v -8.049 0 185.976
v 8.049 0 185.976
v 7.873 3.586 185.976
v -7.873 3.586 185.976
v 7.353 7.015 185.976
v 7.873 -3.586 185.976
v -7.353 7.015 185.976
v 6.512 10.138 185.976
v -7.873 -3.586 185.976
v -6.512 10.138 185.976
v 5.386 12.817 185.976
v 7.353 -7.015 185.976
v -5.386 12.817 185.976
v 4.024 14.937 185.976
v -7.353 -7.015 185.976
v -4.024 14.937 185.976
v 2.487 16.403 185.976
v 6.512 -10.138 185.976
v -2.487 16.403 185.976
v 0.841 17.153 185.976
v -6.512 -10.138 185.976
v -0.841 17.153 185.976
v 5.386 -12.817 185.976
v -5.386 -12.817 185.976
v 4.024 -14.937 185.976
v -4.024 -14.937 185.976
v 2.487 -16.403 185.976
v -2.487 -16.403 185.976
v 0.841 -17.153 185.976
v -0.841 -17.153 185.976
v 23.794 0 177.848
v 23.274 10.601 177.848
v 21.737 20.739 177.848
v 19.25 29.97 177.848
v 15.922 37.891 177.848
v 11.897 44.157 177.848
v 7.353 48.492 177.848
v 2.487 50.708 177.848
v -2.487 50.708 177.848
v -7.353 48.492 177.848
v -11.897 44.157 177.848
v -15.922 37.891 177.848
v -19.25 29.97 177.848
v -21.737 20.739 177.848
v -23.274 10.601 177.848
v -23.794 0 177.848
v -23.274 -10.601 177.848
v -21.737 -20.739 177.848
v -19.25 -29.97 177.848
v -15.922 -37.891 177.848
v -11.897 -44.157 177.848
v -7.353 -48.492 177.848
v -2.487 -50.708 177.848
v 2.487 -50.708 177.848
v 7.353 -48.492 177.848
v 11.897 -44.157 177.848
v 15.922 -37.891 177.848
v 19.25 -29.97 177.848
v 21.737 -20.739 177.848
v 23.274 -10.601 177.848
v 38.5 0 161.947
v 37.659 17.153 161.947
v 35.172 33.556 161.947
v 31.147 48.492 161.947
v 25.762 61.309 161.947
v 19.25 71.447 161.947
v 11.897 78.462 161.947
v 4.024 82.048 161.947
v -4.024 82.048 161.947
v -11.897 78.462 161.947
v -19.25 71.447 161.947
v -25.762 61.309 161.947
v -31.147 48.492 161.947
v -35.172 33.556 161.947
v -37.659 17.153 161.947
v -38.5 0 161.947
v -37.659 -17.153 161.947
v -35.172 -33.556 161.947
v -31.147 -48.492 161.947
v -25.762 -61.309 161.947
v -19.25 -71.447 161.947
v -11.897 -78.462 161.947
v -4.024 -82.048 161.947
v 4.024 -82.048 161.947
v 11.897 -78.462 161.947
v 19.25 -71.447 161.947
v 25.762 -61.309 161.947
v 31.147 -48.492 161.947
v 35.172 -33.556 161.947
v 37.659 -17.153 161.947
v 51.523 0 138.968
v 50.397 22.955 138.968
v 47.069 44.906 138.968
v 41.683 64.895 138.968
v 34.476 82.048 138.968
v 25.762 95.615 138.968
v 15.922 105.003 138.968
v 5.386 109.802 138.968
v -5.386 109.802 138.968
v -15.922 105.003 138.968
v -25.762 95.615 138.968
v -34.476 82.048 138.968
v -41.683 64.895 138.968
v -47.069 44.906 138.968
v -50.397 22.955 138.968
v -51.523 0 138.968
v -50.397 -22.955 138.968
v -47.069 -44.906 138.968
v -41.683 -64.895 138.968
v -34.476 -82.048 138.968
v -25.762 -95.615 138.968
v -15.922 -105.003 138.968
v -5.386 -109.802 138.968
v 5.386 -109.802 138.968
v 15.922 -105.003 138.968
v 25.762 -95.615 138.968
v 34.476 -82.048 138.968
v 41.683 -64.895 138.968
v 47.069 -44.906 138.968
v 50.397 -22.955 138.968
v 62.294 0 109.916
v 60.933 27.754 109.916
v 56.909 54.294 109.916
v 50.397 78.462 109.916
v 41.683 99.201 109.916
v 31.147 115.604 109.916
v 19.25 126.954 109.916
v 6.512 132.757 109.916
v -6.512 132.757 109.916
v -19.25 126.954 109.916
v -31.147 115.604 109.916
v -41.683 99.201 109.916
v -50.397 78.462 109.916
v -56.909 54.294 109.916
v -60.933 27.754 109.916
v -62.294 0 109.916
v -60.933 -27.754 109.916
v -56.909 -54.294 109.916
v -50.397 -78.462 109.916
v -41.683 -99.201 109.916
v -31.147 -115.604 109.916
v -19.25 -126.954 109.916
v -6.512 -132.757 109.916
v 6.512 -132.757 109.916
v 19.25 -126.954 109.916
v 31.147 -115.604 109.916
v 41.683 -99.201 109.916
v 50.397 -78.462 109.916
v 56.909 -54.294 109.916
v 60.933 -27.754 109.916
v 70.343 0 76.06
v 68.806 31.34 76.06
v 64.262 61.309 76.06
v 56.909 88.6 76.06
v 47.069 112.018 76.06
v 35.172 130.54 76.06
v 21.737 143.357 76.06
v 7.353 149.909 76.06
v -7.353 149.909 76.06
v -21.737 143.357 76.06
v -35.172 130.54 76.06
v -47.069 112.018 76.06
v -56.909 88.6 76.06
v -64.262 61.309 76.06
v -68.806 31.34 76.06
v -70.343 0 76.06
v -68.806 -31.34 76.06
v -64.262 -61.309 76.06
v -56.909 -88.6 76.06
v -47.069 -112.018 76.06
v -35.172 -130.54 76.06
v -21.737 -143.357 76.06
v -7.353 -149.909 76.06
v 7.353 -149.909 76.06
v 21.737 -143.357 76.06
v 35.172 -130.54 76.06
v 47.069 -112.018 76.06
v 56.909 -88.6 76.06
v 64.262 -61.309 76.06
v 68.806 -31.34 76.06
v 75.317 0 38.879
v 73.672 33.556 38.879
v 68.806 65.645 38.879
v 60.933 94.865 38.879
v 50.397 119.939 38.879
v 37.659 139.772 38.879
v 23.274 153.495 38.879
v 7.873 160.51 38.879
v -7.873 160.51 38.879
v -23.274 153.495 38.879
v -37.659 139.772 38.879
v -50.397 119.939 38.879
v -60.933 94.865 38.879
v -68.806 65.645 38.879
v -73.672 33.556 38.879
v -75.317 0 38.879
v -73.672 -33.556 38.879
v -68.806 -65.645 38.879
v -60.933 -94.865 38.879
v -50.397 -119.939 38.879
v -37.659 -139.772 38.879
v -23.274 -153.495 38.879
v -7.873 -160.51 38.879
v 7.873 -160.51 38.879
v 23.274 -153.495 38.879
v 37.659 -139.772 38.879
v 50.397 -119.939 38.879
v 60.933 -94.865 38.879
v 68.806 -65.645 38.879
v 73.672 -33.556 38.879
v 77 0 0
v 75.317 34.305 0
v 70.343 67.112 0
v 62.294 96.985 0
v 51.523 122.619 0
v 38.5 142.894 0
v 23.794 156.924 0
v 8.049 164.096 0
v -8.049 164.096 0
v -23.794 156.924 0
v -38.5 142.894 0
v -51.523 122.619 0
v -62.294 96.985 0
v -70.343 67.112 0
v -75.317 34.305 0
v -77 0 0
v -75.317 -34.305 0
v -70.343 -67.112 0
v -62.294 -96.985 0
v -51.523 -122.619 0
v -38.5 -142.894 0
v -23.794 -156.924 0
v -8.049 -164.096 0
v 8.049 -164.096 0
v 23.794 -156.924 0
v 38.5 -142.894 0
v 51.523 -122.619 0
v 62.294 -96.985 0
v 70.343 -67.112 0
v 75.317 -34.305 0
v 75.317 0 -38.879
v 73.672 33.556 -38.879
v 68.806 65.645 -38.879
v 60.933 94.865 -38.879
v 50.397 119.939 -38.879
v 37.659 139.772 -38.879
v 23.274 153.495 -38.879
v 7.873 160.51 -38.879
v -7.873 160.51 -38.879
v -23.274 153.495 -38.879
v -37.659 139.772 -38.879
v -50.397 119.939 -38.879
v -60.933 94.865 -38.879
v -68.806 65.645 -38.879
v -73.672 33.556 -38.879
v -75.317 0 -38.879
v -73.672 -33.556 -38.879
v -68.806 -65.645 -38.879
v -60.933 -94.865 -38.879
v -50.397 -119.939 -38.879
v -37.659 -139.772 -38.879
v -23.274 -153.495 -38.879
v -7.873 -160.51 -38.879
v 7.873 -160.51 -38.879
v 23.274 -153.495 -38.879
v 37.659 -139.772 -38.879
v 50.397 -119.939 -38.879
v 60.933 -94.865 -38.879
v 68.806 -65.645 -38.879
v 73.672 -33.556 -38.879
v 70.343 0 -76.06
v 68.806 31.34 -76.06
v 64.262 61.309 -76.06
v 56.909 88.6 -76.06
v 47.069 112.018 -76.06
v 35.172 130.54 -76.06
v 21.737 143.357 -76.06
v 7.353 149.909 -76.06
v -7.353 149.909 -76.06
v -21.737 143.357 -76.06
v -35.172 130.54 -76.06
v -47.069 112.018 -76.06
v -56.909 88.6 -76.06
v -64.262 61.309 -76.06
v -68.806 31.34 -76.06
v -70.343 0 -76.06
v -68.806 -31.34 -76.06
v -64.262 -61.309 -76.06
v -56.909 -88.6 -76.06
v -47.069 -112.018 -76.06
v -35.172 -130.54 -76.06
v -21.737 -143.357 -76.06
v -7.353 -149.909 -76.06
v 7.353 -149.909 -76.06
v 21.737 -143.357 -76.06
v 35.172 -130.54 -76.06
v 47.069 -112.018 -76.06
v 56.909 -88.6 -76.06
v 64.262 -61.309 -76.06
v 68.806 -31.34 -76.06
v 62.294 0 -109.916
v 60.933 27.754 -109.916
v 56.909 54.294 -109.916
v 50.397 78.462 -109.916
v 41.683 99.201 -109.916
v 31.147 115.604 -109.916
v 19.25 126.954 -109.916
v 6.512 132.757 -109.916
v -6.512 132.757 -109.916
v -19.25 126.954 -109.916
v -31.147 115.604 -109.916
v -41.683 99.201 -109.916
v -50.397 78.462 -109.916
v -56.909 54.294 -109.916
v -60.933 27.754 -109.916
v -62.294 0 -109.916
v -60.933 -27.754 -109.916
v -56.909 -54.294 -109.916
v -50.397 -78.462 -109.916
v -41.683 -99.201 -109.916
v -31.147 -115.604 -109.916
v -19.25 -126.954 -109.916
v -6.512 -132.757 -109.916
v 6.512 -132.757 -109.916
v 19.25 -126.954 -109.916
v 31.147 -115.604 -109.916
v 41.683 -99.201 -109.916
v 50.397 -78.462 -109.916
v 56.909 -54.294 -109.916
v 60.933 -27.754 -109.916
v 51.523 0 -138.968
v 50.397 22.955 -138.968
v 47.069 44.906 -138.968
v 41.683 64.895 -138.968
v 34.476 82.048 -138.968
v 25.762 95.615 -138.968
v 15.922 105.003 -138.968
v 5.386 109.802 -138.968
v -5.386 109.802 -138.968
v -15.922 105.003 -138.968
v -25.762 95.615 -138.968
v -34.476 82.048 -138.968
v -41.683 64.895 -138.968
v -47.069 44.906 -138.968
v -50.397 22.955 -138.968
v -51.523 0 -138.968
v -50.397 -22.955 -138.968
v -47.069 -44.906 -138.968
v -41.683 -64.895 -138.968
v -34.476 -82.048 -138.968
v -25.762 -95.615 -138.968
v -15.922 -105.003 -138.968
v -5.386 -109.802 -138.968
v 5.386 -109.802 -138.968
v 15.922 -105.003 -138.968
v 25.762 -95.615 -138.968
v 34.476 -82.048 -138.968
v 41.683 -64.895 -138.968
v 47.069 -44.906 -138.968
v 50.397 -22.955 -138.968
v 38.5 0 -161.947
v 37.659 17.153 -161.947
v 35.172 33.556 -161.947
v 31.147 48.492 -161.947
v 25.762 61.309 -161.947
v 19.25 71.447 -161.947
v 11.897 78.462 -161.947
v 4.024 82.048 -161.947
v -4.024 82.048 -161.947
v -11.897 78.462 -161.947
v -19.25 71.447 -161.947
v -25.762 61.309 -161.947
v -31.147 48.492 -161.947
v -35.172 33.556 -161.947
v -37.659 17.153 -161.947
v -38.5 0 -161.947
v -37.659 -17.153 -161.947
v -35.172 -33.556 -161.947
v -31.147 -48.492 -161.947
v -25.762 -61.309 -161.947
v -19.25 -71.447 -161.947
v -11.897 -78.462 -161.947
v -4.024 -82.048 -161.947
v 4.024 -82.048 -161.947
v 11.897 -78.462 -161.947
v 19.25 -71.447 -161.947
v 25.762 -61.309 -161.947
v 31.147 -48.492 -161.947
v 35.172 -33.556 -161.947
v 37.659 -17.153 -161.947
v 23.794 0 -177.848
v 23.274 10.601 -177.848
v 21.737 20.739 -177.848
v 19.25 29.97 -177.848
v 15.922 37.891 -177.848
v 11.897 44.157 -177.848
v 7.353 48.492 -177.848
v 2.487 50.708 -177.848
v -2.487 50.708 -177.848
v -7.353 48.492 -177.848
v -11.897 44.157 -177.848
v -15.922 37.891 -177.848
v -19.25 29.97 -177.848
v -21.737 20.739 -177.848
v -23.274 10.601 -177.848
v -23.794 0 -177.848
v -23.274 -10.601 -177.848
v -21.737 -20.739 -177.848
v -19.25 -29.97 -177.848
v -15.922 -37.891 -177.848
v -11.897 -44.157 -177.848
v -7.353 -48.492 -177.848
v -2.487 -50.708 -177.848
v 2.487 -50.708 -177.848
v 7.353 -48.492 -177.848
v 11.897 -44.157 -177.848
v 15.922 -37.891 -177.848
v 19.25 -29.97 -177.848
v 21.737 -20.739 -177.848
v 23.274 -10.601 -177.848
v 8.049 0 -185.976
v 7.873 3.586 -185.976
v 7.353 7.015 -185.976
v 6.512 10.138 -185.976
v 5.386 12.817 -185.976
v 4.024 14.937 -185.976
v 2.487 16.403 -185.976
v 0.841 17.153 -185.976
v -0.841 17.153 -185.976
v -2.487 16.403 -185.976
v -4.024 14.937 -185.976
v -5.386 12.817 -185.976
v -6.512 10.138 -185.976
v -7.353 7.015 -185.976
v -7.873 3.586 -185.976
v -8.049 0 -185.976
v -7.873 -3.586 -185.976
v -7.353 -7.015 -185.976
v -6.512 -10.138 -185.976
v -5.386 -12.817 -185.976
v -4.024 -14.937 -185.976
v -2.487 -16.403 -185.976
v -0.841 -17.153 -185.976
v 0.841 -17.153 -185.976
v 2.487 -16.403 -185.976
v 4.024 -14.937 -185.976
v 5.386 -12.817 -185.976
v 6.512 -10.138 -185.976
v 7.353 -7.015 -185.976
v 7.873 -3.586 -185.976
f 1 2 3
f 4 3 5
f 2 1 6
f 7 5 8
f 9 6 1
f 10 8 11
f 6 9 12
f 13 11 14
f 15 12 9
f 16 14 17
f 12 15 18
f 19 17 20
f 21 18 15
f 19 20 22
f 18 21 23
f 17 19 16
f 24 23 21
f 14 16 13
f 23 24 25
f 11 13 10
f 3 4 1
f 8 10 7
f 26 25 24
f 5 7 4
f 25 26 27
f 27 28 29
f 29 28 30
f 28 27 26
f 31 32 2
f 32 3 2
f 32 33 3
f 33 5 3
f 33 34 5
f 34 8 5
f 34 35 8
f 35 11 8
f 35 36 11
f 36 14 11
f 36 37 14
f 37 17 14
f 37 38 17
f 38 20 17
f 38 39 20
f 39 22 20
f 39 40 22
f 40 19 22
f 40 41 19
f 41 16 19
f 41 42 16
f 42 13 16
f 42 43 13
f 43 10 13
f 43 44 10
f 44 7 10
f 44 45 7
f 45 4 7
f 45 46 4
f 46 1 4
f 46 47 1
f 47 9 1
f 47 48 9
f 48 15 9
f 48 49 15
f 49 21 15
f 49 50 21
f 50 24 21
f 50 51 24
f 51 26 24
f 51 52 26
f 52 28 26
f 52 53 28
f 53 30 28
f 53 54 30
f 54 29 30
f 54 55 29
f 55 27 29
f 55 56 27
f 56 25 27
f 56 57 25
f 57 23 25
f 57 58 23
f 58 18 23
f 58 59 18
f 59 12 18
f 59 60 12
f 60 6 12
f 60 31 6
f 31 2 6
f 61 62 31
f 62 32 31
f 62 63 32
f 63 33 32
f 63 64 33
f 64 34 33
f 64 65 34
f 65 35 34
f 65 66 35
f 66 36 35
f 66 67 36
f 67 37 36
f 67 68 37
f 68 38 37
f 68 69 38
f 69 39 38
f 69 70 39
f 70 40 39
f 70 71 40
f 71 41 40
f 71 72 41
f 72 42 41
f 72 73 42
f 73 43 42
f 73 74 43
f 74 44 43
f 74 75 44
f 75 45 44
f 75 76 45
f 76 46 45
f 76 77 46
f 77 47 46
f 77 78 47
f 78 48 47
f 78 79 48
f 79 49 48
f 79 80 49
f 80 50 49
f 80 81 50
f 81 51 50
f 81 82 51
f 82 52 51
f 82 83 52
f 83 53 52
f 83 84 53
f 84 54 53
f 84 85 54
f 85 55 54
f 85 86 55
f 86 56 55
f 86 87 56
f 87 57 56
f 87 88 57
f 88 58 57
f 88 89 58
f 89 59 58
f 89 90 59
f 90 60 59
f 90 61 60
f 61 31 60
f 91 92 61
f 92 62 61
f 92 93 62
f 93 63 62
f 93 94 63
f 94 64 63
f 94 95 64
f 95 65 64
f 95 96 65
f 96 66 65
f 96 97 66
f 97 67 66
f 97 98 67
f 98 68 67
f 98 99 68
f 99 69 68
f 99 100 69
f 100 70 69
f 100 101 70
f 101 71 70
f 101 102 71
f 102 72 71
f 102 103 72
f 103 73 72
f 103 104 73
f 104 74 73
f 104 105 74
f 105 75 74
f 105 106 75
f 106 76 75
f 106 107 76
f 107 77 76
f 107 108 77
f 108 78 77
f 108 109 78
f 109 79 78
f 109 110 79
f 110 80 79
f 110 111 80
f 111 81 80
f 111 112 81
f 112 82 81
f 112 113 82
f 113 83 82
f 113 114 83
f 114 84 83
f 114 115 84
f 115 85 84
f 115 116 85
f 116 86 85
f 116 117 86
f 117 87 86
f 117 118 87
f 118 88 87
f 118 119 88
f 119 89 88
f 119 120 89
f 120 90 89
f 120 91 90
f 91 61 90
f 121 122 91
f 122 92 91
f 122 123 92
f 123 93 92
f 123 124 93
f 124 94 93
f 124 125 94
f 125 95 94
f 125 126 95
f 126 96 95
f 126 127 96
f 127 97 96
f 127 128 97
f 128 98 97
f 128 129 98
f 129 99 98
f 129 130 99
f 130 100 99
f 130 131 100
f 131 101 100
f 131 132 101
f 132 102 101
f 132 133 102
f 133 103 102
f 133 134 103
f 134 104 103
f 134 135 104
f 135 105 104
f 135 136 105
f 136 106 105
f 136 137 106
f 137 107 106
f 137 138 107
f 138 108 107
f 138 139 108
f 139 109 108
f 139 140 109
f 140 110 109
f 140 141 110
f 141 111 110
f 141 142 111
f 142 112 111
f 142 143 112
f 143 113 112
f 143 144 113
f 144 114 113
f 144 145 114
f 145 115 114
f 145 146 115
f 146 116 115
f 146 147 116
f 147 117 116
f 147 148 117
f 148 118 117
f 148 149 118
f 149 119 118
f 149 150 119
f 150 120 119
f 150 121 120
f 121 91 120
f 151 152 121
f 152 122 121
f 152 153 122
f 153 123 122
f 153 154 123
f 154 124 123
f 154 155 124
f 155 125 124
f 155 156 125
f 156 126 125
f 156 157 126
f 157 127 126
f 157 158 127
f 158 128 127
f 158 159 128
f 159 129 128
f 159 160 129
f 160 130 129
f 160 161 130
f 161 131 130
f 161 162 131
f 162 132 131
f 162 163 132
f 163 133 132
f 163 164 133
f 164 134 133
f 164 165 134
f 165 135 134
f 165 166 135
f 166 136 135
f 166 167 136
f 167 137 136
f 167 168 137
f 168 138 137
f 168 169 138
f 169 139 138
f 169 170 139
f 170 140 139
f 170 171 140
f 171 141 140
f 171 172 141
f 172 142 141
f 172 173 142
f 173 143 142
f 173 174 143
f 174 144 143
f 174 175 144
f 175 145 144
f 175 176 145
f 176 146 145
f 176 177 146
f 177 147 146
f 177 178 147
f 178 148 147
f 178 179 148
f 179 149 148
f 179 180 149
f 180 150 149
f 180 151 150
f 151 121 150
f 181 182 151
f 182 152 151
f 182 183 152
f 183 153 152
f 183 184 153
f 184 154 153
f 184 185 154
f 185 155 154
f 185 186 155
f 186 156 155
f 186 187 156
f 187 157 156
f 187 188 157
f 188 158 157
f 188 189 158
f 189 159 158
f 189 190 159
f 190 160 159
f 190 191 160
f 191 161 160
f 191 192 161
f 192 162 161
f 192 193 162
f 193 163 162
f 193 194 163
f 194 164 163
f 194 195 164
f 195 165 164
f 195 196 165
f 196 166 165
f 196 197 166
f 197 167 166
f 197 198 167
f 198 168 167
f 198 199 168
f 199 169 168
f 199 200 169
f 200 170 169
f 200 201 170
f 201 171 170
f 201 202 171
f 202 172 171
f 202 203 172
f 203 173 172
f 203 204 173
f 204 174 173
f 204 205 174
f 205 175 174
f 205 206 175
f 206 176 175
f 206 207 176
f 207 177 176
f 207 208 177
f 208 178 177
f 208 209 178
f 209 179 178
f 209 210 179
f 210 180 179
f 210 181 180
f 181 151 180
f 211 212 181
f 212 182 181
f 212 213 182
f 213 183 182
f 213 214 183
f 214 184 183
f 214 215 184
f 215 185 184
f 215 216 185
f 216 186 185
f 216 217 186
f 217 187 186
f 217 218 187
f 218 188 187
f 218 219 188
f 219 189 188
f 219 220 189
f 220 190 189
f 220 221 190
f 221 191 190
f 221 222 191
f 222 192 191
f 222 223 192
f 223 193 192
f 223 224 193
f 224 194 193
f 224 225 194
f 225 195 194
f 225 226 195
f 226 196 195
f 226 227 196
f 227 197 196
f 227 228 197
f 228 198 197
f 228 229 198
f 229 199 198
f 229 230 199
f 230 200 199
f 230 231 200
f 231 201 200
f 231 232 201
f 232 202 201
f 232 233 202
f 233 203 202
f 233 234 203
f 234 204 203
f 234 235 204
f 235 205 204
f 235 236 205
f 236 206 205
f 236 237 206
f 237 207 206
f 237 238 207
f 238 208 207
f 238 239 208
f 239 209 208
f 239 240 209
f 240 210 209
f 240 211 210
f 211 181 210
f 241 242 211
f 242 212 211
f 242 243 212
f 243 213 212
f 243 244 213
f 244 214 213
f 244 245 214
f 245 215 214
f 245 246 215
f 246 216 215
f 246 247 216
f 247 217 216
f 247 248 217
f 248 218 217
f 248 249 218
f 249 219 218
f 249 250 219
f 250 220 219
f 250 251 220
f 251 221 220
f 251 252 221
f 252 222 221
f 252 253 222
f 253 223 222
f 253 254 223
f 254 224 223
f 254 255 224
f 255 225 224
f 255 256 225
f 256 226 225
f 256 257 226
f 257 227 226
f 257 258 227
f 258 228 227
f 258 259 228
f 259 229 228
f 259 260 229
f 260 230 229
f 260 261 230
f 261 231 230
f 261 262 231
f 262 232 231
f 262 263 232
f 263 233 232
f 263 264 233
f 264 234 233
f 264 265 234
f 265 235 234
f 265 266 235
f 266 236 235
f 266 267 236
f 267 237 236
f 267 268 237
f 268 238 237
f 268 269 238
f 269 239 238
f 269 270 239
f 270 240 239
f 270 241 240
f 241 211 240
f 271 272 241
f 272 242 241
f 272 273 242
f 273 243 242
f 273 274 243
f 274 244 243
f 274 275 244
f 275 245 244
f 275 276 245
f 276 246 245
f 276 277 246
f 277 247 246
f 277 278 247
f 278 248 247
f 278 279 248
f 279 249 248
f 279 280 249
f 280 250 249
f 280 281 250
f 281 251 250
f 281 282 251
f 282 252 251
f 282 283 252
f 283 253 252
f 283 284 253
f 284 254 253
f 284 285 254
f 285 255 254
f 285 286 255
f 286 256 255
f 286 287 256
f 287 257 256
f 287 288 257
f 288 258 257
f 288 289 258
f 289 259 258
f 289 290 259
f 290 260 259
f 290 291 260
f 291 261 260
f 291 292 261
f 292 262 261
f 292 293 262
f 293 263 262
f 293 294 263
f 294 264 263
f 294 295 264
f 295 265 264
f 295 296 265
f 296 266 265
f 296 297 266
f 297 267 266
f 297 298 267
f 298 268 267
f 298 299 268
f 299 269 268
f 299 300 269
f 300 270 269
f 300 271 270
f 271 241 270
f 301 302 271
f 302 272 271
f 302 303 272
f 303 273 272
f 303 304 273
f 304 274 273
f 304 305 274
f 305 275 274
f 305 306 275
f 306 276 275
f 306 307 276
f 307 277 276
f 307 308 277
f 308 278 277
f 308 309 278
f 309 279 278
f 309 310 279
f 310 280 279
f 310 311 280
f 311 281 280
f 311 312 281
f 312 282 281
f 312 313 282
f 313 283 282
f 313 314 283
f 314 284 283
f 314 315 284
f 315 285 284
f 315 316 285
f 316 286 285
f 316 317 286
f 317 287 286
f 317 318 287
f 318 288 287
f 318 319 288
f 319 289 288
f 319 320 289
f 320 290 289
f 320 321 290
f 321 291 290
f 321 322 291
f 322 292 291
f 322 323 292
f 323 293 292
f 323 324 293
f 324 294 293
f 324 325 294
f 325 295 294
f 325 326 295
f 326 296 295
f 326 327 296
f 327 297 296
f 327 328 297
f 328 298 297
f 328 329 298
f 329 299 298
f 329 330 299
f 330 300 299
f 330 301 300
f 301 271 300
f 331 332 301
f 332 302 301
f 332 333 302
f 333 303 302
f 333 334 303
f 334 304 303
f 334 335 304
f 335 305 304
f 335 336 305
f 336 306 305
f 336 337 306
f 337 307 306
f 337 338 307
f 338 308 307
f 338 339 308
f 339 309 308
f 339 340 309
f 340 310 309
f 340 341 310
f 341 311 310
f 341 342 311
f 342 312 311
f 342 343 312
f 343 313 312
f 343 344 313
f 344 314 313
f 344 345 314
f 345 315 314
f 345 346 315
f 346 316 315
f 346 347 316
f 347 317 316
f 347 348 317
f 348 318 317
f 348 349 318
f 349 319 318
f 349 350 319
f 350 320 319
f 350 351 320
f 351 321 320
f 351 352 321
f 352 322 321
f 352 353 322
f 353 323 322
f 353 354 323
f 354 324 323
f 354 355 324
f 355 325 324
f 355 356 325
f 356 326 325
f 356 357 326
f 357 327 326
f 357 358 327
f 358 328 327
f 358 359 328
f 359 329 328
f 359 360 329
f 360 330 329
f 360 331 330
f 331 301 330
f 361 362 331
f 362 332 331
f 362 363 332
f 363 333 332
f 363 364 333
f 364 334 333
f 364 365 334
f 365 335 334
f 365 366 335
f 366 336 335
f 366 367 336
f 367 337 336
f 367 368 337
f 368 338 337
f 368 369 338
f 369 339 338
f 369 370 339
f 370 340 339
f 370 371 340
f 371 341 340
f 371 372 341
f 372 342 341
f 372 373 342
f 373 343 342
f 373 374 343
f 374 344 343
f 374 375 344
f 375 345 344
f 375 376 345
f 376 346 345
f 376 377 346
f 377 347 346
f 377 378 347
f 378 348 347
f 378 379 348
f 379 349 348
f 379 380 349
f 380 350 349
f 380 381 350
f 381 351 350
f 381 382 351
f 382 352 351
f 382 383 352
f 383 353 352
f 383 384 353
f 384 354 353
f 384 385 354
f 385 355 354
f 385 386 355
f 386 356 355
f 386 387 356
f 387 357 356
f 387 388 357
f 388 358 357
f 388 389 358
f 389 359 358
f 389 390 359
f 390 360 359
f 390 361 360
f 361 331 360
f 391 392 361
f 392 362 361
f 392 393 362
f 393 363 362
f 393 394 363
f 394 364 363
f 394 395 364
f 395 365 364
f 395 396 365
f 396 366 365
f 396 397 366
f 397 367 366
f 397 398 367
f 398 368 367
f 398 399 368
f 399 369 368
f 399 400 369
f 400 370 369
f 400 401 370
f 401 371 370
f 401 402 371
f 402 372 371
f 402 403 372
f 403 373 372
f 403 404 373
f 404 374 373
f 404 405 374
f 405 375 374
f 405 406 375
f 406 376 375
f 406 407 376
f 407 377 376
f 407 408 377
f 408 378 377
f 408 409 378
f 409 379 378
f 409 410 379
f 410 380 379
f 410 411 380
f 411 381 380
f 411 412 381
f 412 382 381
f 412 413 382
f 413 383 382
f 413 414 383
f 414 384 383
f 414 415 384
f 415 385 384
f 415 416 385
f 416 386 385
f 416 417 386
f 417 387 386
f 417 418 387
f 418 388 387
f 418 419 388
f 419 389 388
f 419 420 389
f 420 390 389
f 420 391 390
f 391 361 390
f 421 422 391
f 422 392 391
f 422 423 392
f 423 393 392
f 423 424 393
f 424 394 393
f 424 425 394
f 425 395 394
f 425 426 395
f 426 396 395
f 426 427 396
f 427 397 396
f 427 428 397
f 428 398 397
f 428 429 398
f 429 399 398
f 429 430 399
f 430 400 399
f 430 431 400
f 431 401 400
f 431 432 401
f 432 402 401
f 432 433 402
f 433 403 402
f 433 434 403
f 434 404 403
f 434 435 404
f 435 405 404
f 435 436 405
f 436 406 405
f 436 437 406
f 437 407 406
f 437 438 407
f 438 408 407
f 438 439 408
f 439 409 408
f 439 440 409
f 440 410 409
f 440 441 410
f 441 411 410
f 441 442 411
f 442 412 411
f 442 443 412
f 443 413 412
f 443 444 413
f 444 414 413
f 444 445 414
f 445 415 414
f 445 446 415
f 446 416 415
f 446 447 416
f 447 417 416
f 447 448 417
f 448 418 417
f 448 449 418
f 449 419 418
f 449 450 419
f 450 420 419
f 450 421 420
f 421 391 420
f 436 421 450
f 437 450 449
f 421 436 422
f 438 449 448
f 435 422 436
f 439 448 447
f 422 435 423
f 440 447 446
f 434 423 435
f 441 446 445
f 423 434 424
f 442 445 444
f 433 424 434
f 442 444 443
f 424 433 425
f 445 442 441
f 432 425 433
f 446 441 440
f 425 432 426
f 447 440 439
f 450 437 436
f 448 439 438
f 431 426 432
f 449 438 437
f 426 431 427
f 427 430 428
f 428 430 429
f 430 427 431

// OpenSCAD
// Generated by SolidPython 1.0.1 on 2020-07-29 00:46:48


scale(v = [7, 15, 17]) {
	sphere(r = 11);
}
/***********************************************
*********      SolidPython code:      **********
************************************************
 
# import packages: SolidPython
from solid import *
from solid.utils import *
from itertools import chain, combinations, permutations


class Resize:

    def __init__(self, scad_file):
        self.scad_file = scad_file
        #self.scad_file = import_scad(scad_file)
        # cone/cylinder param:
        self.r1 = 0
        self.r2 = 0
        self.h = 0
        # rectangular prism param:
        self.w = 0
        self.l = 0
        # ellipse param:
        self.r = 0

    # import OpenScad code (file name corresponds to shape)


    # classify shape + parameters
    def assign(self, param1, param2, param3):
        if self.scad_file == 'cone.scad':
            self.r1 = param1
            self.r2 = param2
            self.h = param3
        elif self.scad_file == 'cylinder.scad':
            self.r1 = param1
            self.r2 = param2
            self.h = param3
        elif self.scad_file == 'rectangularPrism.scad':
            self.h = param1
            self.l = param2
            self.w = param3
        else:
            self.r = param1
            self.h = param2

    # resize parameters
    def iterate(self):
        x = range(3, 20, 2)
        i = 1
        if self.scad_file == 'cone.scad':
            tempList = list(permutations(x, 2))
            for temp in tempList:
                param1 = temp[0]
                param2 = temp[1]
                filepath = 'produced_scad_files/' + 'cone' + str(param1) + '_' + str(param2) + '_' + '.scad'
                scad_render_to_file(cylinder(h=param1, r1=param2, r2=0), filepath)

        elif self.scad_file == 'cylinder.scad':
            tempList = list(permutations(x, 3))
            for temp in tempList:
                param1 = temp[0]
                param2 = temp[1]
                filepath = 'produced_scad_files/' + 'cylinder' + str(param1) + '_' + str(param2) + '_' + '.scad'
                scad_render_to_file(cylinder(h=param1, r1=param2, r2=param2), filepath)

        elif self.scad_file == 'rectangularPrism.scad':
            tempList = list(permutations(x, 3))
            for temp in tempList:
                param1 = temp[0]
                param2 = temp[1]
                param3 = temp[2]
                filepath = 'produced_scad_files/' + 'rectangularPrism' + str(param1) + '_' + str(param2) + '_' + str(
                    param3) + '.scad'
                scad_render_to_file(cube(size=(param1, param2, param3)), filepath)

        elif self.scad_file == 'ellipse.scad':
            tempList = list(permutations(x, 4))
            for temp in tempList:
                param1 = temp[0]
                param2 = temp[1]
                param3 = temp[2]
                param4 = temp[3]
                filepath = 'produced_scad_files/' + 'ellipse' + str(param1) + '_' + str(param2) + '_' + str(param3) + '_' + str(param4) + '.scad'
                scad_render_to_file(scale([param1, param2, param3])(sphere(r=param4)), filepath)

    def render_to_scadfile(self):
        scad_render_to_file(scad, 'example.scad') 
 
************************************************/
